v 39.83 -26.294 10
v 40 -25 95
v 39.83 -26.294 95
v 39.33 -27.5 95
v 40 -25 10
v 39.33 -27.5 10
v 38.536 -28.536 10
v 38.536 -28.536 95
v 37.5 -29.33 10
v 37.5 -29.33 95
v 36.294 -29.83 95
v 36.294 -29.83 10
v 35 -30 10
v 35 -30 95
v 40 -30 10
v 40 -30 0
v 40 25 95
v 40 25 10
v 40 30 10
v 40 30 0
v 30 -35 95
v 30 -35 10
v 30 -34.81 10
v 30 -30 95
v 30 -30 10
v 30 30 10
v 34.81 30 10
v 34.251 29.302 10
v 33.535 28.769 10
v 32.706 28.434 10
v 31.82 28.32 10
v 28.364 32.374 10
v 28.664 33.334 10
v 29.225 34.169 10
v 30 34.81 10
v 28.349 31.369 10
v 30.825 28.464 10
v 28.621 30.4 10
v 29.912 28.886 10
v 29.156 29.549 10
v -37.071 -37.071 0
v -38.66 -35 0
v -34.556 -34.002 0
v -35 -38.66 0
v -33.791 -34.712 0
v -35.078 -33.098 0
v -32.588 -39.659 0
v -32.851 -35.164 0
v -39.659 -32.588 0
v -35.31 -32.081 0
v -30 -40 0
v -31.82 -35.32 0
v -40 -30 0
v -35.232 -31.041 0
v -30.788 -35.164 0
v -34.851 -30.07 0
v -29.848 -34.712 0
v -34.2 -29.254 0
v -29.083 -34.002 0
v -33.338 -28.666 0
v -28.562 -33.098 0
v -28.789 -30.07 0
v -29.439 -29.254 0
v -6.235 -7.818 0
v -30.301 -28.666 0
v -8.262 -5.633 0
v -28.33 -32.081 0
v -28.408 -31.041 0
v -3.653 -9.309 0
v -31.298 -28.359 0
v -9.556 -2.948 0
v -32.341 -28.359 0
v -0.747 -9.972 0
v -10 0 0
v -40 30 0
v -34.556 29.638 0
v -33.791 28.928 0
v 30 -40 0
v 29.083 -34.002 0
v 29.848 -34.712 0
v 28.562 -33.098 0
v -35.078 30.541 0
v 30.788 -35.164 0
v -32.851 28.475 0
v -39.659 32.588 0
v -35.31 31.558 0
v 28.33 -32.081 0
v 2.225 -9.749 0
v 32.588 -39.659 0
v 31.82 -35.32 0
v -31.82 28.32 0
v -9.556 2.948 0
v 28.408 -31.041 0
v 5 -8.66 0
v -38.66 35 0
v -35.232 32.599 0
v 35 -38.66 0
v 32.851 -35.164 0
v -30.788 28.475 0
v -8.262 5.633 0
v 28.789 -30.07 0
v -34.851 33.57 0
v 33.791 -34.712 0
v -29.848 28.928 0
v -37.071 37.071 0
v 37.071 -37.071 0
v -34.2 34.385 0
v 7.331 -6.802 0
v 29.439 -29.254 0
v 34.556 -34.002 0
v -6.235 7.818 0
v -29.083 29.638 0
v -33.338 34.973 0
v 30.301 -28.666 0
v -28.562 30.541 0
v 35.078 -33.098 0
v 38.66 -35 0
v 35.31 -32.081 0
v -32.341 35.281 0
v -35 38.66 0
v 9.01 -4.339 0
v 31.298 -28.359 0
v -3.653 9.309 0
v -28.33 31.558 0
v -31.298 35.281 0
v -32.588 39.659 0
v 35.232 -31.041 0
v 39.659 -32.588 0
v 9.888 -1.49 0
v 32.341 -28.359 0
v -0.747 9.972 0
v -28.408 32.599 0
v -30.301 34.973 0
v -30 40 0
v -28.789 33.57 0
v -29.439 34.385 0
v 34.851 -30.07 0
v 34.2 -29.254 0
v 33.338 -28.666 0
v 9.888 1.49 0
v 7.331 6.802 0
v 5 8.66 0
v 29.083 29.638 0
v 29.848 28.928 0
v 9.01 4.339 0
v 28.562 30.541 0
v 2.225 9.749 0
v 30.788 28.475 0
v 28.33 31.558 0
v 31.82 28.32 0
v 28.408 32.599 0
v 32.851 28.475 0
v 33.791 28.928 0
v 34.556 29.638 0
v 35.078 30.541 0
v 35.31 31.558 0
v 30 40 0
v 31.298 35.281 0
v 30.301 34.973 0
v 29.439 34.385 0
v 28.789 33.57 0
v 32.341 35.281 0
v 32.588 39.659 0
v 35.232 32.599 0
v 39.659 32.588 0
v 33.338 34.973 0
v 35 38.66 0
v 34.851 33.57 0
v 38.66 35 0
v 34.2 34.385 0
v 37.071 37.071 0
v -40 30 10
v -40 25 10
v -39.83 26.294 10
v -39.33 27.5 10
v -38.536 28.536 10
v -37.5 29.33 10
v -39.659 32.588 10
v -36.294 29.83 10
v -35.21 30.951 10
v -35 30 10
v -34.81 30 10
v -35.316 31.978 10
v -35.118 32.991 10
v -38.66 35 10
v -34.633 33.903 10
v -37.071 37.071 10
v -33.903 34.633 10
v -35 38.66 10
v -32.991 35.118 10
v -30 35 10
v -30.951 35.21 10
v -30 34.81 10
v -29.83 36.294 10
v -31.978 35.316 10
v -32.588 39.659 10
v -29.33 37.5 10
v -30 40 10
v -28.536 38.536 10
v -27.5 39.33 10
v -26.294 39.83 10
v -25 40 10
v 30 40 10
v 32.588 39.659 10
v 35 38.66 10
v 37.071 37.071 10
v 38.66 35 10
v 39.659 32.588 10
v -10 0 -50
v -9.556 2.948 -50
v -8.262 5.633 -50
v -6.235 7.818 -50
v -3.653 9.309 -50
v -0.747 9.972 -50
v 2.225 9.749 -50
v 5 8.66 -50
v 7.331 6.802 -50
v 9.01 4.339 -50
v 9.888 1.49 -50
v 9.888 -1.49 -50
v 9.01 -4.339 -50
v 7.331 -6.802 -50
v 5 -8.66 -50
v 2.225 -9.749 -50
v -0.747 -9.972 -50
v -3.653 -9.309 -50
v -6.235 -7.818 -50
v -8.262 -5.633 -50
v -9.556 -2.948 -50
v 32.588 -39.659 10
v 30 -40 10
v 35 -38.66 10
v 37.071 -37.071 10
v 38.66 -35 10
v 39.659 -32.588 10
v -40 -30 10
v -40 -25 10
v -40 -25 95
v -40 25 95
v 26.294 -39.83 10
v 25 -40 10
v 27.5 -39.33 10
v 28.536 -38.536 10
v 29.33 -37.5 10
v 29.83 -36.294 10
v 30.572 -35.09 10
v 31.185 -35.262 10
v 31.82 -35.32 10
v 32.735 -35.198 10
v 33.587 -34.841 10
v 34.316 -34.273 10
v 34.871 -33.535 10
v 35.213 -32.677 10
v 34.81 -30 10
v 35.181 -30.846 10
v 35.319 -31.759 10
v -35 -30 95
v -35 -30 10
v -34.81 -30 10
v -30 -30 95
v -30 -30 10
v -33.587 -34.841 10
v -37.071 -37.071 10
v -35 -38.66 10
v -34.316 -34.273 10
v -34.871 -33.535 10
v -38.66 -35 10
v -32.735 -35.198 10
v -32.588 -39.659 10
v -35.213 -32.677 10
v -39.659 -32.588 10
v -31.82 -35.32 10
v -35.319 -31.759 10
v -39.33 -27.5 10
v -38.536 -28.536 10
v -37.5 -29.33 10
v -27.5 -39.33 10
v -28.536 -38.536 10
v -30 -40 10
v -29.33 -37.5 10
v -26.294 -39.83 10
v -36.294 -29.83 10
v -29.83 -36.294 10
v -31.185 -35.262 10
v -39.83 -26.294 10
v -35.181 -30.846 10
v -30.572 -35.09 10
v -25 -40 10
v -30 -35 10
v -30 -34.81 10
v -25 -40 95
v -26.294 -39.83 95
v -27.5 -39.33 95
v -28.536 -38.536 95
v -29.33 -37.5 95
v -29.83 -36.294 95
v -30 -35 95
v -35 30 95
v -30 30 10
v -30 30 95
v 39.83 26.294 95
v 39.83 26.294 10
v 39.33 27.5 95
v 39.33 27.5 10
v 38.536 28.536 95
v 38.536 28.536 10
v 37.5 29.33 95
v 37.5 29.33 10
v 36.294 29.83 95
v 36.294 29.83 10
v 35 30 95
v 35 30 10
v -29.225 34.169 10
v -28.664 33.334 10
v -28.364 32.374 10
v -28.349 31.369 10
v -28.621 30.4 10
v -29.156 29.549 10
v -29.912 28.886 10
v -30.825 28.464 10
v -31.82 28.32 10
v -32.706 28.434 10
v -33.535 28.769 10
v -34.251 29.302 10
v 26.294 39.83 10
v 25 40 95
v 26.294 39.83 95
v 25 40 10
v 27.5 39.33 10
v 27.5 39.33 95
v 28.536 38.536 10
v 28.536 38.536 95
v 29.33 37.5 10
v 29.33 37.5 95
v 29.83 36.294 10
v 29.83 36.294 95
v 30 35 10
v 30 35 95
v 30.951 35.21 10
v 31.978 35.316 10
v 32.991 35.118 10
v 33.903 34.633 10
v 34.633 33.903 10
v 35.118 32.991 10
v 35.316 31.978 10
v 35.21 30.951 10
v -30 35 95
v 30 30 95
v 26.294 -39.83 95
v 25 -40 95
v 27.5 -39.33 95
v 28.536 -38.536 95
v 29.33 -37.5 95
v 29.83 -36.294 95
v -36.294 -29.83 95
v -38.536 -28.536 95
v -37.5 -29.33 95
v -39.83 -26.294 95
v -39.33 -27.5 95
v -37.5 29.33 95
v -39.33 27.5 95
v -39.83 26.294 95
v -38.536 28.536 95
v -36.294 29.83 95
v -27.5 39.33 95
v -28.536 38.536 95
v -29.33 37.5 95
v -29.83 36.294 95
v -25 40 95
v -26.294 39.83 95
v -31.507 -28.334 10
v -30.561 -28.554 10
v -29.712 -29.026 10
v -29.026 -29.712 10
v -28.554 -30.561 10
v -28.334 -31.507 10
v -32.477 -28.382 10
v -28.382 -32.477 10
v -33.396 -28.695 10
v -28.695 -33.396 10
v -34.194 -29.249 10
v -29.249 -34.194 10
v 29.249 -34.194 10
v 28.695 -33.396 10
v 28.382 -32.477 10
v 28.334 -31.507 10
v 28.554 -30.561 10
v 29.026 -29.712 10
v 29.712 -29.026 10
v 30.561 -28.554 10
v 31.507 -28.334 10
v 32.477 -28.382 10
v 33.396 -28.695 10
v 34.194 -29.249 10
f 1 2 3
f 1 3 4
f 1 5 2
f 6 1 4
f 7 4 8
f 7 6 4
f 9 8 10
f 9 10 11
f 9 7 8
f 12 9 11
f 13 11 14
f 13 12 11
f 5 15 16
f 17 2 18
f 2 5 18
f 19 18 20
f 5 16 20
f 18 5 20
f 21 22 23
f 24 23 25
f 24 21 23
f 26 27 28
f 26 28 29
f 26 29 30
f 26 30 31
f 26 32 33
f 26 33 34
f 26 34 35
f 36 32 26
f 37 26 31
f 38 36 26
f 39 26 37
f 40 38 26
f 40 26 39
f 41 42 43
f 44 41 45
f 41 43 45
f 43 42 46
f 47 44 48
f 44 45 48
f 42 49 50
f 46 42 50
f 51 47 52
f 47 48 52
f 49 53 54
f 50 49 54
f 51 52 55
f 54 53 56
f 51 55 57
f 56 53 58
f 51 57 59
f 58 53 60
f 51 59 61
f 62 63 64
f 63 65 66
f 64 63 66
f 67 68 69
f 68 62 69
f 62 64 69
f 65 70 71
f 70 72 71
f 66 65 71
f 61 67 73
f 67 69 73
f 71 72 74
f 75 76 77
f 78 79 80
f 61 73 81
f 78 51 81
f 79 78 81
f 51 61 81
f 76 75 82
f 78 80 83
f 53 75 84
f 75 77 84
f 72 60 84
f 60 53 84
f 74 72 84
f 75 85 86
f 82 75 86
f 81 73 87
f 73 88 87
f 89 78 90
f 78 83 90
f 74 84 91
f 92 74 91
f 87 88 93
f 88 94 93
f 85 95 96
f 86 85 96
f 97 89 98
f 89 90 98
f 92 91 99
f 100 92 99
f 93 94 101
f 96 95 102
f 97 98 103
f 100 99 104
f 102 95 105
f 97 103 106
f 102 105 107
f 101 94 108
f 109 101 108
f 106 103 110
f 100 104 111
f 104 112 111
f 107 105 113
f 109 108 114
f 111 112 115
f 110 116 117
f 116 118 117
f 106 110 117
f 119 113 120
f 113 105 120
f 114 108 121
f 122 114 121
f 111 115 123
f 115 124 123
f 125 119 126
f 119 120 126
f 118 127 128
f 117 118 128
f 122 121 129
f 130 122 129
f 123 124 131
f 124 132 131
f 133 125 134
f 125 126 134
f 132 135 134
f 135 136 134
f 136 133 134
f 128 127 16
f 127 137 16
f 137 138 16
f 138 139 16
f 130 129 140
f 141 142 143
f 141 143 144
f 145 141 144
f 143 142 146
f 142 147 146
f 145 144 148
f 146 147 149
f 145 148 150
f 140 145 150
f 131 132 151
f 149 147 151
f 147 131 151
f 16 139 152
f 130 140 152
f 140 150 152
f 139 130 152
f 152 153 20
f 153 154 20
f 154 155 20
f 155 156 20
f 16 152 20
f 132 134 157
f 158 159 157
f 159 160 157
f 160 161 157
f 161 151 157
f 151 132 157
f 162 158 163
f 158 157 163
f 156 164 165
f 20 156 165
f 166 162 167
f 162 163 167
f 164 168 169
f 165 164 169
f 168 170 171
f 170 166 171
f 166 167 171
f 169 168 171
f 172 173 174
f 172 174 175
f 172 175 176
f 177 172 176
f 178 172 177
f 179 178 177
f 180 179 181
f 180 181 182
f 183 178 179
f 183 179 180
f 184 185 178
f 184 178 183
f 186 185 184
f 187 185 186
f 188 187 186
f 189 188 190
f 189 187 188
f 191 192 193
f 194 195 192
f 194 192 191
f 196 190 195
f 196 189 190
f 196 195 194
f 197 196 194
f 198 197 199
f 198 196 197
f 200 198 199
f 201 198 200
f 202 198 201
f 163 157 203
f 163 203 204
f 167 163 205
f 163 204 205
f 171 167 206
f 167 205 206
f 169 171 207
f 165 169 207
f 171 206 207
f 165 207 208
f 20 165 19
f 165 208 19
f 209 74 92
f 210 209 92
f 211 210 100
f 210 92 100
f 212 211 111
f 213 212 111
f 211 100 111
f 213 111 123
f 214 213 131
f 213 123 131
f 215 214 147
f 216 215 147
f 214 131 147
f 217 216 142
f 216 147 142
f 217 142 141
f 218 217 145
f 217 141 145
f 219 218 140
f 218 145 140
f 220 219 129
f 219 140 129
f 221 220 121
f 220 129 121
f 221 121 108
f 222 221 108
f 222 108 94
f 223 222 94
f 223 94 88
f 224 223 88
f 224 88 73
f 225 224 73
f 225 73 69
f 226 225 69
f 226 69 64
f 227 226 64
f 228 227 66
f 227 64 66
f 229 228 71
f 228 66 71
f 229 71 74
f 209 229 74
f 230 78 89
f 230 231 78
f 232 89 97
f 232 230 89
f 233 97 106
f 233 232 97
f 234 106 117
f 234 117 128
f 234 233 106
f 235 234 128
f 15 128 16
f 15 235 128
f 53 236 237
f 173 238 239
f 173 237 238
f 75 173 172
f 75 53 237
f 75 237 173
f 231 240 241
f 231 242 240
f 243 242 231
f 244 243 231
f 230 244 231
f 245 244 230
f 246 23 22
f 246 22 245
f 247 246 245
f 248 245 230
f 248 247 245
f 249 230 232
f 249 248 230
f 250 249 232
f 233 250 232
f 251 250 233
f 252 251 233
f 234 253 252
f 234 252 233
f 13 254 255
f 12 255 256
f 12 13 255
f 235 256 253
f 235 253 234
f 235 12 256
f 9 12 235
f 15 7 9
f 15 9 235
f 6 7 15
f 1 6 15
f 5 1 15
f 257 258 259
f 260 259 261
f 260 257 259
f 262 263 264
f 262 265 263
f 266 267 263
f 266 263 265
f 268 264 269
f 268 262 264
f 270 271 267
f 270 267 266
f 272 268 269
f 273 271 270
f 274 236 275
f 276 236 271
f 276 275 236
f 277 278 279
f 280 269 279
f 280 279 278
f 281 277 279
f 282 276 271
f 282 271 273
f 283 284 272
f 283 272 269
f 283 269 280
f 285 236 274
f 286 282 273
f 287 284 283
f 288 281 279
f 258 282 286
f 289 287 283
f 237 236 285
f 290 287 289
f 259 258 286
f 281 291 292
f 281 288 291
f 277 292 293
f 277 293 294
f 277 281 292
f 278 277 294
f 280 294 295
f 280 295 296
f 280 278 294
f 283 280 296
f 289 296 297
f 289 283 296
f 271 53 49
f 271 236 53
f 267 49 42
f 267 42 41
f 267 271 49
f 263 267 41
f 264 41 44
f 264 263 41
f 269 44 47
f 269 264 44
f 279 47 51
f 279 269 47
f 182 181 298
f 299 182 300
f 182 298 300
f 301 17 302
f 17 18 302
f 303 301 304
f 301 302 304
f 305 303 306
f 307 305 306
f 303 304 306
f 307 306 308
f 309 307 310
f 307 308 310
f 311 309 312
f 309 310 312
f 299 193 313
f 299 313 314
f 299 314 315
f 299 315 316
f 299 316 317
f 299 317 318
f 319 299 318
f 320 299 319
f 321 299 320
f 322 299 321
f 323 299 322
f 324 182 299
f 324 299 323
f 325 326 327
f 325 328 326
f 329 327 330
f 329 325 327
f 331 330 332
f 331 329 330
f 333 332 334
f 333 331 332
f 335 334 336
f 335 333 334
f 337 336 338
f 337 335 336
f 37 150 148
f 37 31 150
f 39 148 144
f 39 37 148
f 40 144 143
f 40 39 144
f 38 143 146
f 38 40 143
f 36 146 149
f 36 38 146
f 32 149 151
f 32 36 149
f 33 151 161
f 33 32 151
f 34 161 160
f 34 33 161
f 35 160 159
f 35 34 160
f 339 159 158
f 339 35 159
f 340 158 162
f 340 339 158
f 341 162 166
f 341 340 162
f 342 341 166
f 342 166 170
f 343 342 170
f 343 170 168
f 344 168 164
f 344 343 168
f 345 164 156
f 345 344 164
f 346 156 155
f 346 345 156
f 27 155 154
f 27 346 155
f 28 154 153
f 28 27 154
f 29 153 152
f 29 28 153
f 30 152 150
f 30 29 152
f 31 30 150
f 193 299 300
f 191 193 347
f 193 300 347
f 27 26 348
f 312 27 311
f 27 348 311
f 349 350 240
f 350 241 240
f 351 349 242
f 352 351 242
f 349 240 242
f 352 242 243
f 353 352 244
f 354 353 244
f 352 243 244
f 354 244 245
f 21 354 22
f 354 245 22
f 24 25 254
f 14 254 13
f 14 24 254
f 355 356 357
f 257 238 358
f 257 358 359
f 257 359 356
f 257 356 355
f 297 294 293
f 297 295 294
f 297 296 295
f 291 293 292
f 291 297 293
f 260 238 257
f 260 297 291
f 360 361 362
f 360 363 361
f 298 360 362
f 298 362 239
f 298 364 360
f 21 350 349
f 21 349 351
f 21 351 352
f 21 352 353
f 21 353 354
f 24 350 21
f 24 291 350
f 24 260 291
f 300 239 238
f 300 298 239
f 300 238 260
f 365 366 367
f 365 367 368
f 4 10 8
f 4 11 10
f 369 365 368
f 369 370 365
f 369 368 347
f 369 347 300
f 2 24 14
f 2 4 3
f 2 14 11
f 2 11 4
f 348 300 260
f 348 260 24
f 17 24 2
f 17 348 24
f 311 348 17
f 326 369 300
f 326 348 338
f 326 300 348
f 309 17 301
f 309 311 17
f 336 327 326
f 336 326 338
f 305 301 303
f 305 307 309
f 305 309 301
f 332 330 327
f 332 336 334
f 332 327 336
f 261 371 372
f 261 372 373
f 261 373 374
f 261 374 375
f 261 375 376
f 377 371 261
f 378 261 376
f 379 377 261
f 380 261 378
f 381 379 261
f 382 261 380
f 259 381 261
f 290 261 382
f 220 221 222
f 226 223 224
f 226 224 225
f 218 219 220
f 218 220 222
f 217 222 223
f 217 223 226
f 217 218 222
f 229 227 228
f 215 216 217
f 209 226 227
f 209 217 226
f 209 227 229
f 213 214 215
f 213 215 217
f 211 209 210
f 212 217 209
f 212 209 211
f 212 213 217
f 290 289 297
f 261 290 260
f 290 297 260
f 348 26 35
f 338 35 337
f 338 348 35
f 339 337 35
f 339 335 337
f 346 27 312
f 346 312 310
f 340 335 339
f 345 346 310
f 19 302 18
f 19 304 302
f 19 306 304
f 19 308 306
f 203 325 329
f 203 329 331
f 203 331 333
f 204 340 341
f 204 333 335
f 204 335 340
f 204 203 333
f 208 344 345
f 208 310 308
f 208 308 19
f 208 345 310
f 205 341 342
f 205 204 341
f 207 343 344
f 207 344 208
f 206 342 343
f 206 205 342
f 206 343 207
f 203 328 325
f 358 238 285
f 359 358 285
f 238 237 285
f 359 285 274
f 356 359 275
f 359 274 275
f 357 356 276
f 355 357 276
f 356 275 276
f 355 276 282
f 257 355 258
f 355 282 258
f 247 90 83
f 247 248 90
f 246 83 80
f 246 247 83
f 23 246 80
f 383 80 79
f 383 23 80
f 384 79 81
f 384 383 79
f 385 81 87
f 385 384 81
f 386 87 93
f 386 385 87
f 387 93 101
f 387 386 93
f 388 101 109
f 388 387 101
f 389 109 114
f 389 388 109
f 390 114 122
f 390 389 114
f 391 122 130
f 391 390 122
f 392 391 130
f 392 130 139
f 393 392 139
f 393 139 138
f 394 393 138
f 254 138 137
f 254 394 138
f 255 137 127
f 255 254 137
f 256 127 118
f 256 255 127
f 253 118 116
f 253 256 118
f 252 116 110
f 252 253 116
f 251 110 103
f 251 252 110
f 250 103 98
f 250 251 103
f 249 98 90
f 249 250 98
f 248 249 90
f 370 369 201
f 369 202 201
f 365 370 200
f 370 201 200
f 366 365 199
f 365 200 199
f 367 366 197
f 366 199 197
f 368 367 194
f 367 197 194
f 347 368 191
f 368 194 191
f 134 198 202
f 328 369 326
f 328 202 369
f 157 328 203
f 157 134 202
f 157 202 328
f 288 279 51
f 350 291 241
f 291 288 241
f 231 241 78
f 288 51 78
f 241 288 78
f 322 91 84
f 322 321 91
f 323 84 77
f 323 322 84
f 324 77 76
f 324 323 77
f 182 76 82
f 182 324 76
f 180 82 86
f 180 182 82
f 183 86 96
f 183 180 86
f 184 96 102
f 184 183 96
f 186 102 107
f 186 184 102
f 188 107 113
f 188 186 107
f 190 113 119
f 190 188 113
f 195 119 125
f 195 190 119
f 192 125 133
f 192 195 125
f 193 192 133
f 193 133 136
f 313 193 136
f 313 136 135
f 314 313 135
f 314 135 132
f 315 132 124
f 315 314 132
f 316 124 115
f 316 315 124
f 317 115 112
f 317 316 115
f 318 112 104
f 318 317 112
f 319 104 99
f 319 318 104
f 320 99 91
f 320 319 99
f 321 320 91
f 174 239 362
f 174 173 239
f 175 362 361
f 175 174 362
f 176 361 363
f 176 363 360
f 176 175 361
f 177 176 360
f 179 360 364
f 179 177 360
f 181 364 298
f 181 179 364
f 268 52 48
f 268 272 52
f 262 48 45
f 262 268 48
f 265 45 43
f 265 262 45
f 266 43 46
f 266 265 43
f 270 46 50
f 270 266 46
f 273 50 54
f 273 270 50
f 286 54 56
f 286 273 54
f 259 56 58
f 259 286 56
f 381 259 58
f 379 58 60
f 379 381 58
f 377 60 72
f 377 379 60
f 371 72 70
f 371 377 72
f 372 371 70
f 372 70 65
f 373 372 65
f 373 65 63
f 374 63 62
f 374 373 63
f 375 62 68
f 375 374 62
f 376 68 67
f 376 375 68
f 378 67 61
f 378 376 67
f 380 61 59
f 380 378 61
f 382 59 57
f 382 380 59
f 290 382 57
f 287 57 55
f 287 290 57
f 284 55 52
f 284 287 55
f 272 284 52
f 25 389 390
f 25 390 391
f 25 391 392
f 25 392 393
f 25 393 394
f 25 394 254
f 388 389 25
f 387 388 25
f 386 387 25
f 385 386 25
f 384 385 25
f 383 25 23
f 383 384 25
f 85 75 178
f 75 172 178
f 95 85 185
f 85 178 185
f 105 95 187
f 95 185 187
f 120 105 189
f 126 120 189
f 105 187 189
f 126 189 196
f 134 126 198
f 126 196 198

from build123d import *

# Parameters (mm, degrees)
SKETCH_1_W          = 80
SKETCH_1_H          = 80
EXTRUDE_1_DEPTH     = 95
SKETCH_2_R          = 10
EXTRUDE_2_DEPTH     = 50
SKETCH_3_W          = 10
SKETCH_3_H          = 10
CUT_EXTRUDE_1_DEPTH = 85
FILLET_1_R          = 10
FILLET_3_R          = 5
MM_1_AT_2_COUNT     = 2
MM_1_AT_2_PITCH     = 63.639610307
MM_1_AT_3_COUNT     = 2
MM_1_AT_3_PITCH     = 90
MM_1_AT_4_COUNT     = 2
MM_1_AT_4_PITCH     = 63.639610307


with BuildPart() as part:
    # 草图1 → 凸台-拉伸1 (new body)
    with BuildSketch(Plane.XY):
        Rectangle(SKETCH_1_W, SKETCH_1_H)
    extrude(amount=EXTRUDE_1_DEPTH)

    # 草图2 → 凸台-拉伸2 (add)
    with BuildSketch(Plane(origin=(0, 0, 0), x_dir=(-1, 0, 0), z_dir=(0, 0, -1))):
        Circle(SKETCH_2_R)
    extrude(amount=EXTRUDE_2_DEPTH)

    # 草图3 → 切除-拉伸1 (cut)
    with BuildSketch(Plane.XY.offset(95)):
        with Locations((-35, 35)):
            Rectangle(SKETCH_3_W, SKETCH_3_H)
        with Locations((35, 35)):
            Rectangle(SKETCH_3_W, SKETCH_3_H)
        with Locations((35, -35)):
            Rectangle(SKETCH_3_W, SKETCH_3_H)
        with Locations((-35, -35)):
            Rectangle(SKETCH_3_W, SKETCH_3_H)
    extrude(amount=-CUT_EXTRUDE_1_DEPTH, mode=Mode.SUBTRACT)

    # 圆角1
    fillet_1_edges = [part.edges().sort_by_distance(p)[0] for p in [
        (40, 40, 5),
        (40, -40, 5),
        (-40, 40, 5),
        (-40, -40, 5),
    ]]
    fillet(fillet_1_edges, radius=FILLET_1_R)

    # 圆角3
    fillet_3_edges = [part.edges().sort_by_distance(p)[0] for p in [
        (-30, -40, 52.5),
        (-40, -30, 52.5),
        (40, -30, 52.5),
        (30, -40, 52.5),
        (30, 40, 52.5),
        (40, 30, 52.5),
        (-40, 30, 52.5),
        (-30, 40, 52.5),
    ]]
    fillet(fillet_3_edges, radius=FILLET_3_R)

    # 草图5 → 大小mm 暗销槽口1 (revolve, cut)
    with BuildSketch(Plane(origin=(-31.819805153, 31.819805153, 10), x_dir=(0, -1, 0), z_dir=(1, 0, 0))):
        Polygon((0, 0), (0, 62.103012167), (3.5, 60), (3.5, 0), align=None)
    mm_1 = revolve(axis=Axis((-31.819805153, 31.819805153, 16.35), (0, 0, -1)), mode=Mode.SUBTRACT)

    # 大小mm 暗销槽口1 at 2: 大小mm 暗销槽口1 ×2
    with Locations(*[(i * MM_1_AT_2_PITCH, 0, 0) for i in range(1, MM_1_AT_2_COUNT)]):
        add(mm_1, mode=Mode.SUBTRACT)

    # 大小mm 暗销槽口1 at 3: 大小mm 暗销槽口1 ×2
    with Locations(*[Vector(0.707106781, -0.707106781, 0) * (i * MM_1_AT_3_PITCH) for i in range(1, MM_1_AT_3_COUNT)]):
        add(mm_1, mode=Mode.SUBTRACT)

    # 大小mm 暗销槽口1 at 4: 大小mm 暗销槽口1 ×2
    with Locations(*[(0, -i * MM_1_AT_4_PITCH, 0) for i in range(1, MM_1_AT_4_COUNT)]):
        add(mm_1, mode=Mode.SUBTRACT)


solid = part.part
